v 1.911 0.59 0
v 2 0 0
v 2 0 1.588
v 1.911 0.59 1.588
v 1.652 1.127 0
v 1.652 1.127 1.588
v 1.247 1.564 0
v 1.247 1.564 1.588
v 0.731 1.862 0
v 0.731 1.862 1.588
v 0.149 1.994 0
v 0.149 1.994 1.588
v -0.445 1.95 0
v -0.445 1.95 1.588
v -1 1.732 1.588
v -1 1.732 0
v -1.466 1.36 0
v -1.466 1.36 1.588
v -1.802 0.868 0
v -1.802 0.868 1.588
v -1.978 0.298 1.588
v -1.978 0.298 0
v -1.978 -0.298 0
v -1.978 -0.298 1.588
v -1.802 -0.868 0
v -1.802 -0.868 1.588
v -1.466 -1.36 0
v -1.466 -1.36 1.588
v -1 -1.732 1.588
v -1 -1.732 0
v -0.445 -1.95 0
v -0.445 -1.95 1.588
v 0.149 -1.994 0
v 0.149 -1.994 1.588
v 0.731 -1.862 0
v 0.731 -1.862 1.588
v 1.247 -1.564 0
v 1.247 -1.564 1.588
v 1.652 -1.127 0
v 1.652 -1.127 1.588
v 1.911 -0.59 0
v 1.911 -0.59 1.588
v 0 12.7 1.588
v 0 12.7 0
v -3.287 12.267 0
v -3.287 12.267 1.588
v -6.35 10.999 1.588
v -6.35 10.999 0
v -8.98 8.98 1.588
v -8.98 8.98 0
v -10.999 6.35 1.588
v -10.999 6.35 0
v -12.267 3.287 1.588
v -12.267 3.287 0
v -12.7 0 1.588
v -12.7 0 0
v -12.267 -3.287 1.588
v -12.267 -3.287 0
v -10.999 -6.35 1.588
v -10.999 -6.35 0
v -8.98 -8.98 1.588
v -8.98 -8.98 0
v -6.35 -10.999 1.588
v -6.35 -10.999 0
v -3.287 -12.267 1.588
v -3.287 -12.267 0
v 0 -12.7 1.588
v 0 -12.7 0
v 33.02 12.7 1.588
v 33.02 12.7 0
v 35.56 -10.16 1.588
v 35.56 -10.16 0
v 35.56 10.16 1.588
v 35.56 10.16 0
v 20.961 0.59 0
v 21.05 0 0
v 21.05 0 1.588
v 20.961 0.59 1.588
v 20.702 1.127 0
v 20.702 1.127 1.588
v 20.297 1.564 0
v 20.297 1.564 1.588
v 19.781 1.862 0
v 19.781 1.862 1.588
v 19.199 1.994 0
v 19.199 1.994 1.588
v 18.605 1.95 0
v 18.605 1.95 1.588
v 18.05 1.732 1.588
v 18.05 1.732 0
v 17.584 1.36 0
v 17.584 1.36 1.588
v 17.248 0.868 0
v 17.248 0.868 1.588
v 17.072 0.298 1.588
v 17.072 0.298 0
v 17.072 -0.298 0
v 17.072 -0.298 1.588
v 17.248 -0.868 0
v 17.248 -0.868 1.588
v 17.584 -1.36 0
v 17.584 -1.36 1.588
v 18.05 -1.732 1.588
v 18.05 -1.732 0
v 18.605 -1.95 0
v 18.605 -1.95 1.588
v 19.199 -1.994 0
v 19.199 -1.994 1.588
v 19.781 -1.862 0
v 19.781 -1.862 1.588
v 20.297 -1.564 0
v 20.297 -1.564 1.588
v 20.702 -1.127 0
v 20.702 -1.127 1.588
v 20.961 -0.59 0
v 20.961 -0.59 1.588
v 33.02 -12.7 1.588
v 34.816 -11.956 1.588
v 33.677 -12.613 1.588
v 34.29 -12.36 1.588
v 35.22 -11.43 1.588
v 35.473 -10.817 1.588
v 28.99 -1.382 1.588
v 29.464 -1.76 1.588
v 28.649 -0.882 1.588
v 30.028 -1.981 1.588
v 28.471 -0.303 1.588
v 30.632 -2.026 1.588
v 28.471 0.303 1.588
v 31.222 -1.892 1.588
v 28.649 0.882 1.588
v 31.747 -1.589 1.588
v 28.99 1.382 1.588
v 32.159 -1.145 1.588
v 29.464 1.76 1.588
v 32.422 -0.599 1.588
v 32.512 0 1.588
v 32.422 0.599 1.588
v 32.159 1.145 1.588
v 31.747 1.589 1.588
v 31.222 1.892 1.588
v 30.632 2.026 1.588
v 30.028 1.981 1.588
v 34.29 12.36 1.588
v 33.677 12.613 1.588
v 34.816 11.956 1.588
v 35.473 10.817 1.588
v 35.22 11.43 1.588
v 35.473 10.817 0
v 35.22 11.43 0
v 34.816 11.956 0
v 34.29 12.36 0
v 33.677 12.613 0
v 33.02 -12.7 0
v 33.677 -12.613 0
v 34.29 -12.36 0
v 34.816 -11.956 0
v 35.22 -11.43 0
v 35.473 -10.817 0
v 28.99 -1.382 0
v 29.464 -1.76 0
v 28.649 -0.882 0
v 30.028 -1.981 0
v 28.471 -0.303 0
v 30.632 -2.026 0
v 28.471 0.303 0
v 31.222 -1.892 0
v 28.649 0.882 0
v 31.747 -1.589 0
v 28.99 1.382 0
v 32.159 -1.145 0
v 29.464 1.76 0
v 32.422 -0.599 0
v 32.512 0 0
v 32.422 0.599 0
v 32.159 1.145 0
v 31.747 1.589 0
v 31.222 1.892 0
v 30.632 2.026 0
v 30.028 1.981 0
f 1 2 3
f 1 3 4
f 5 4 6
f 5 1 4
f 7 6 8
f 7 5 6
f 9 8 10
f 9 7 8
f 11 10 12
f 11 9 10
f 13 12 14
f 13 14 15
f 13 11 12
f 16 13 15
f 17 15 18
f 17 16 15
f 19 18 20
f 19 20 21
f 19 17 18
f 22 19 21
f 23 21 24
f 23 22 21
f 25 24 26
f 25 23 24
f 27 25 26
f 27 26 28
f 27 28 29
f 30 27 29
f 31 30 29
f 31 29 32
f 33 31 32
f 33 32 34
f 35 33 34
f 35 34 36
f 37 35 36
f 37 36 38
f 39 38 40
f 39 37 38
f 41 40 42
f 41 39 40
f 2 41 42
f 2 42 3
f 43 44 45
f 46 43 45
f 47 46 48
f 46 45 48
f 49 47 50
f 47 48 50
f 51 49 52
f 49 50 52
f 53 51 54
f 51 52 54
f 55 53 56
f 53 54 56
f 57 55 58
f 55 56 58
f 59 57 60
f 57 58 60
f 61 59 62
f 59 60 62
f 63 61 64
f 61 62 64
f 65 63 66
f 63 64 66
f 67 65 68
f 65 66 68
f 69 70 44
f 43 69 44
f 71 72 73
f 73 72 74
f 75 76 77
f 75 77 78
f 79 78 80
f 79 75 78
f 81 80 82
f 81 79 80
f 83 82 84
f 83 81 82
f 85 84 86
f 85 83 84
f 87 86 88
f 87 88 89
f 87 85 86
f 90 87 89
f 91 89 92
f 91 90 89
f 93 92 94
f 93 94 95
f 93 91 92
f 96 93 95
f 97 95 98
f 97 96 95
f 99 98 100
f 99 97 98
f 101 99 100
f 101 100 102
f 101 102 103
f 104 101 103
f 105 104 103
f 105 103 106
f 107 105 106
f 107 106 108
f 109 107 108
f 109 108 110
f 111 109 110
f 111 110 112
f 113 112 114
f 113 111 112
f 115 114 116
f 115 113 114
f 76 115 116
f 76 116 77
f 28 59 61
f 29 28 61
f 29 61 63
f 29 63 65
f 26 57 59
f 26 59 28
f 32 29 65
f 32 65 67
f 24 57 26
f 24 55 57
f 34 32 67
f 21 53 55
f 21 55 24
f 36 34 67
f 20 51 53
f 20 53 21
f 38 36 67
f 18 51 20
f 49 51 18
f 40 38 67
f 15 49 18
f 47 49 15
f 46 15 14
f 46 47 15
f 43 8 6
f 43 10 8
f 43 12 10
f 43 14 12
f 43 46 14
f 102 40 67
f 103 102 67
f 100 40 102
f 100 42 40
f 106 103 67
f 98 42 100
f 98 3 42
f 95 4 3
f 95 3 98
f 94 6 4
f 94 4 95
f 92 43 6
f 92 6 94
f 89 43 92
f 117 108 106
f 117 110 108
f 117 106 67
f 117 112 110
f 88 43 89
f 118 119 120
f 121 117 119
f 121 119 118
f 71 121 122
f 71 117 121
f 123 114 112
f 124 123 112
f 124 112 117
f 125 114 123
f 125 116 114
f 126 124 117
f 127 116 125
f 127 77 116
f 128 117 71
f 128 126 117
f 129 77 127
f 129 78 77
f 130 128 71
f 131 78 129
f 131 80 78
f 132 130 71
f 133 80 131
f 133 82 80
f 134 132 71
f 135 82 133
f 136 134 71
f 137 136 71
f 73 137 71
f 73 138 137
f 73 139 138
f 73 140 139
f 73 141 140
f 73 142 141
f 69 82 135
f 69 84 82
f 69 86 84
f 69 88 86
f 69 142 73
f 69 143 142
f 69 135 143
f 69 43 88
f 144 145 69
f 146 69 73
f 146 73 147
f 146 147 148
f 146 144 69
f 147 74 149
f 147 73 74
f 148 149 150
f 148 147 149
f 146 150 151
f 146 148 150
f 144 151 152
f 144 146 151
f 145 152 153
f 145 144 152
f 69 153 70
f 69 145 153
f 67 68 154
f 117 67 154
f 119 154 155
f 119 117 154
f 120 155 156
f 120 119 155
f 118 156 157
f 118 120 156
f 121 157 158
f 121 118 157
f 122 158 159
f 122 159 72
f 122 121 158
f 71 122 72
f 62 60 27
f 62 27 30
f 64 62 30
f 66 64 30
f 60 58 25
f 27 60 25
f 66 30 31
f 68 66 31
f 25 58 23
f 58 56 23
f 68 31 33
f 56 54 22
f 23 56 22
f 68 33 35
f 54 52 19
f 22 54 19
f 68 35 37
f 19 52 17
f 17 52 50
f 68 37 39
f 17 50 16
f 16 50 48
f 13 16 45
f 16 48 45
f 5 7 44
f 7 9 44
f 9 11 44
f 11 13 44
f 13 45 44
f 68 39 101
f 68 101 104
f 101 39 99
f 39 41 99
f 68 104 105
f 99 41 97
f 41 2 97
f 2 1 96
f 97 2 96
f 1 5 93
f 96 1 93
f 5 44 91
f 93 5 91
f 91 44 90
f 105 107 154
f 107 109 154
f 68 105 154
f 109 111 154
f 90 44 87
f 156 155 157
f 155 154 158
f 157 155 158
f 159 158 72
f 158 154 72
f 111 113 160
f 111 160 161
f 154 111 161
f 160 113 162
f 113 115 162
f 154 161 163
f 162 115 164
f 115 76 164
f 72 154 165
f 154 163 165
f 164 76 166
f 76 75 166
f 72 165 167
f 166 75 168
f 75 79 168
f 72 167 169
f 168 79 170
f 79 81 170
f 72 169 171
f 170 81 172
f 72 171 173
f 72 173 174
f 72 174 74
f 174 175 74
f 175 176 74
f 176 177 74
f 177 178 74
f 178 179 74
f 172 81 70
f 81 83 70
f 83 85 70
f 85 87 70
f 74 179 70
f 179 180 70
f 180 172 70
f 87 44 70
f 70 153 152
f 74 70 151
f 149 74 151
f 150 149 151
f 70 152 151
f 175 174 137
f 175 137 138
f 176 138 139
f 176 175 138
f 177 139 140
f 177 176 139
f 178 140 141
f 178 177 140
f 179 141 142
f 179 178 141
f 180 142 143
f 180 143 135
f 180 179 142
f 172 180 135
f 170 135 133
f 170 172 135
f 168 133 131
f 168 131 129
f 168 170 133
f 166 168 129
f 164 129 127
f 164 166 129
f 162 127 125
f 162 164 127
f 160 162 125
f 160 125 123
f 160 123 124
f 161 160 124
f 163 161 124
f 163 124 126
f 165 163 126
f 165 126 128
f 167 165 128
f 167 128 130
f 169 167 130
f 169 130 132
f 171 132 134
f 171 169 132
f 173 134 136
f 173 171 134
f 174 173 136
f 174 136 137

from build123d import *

# Parameters (mm, degrees)
SKETCH1_R           = 2
SKETCH1_R_2         = 2.032
BOSS_EXTRUDE1_DEPTH = 1.5875
FILLET1_R           = 2.54


with BuildPart() as part:
    # Sketch1 → Boss-Extrude1 (new body)
    with BuildSketch(Plane.XY):
        with BuildLine():
            Line((0, -12.7), (35.56, -12.7))
            Line((35.56, -12.7), (35.56, 12.7))
            Line((35.56, 12.7), (0, 12.7))
            ThreePointArc((0, 12.7), (-12.7, 0), (0, -12.7))
        make_face()
        Circle(SKETCH1_R, mode=Mode.SUBTRACT)
        with Locations((19.05, 0)):
            Circle(SKETCH1_R, mode=Mode.SUBTRACT)
        with Locations((30.48, 0)):
            Circle(SKETCH1_R_2, mode=Mode.SUBTRACT)
    extrude(amount=BOSS_EXTRUDE1_DEPTH)

    # Fillet1
    fillet1_edges = [part.edges().sort_by_distance(p)[0] for p in [
        (35.56, 12.7, 0.79375),
        (35.56, -12.7, 0.79375),
    ]]
    fillet(fillet1_edges, radius=FILLET1_R)


solid = part.part
